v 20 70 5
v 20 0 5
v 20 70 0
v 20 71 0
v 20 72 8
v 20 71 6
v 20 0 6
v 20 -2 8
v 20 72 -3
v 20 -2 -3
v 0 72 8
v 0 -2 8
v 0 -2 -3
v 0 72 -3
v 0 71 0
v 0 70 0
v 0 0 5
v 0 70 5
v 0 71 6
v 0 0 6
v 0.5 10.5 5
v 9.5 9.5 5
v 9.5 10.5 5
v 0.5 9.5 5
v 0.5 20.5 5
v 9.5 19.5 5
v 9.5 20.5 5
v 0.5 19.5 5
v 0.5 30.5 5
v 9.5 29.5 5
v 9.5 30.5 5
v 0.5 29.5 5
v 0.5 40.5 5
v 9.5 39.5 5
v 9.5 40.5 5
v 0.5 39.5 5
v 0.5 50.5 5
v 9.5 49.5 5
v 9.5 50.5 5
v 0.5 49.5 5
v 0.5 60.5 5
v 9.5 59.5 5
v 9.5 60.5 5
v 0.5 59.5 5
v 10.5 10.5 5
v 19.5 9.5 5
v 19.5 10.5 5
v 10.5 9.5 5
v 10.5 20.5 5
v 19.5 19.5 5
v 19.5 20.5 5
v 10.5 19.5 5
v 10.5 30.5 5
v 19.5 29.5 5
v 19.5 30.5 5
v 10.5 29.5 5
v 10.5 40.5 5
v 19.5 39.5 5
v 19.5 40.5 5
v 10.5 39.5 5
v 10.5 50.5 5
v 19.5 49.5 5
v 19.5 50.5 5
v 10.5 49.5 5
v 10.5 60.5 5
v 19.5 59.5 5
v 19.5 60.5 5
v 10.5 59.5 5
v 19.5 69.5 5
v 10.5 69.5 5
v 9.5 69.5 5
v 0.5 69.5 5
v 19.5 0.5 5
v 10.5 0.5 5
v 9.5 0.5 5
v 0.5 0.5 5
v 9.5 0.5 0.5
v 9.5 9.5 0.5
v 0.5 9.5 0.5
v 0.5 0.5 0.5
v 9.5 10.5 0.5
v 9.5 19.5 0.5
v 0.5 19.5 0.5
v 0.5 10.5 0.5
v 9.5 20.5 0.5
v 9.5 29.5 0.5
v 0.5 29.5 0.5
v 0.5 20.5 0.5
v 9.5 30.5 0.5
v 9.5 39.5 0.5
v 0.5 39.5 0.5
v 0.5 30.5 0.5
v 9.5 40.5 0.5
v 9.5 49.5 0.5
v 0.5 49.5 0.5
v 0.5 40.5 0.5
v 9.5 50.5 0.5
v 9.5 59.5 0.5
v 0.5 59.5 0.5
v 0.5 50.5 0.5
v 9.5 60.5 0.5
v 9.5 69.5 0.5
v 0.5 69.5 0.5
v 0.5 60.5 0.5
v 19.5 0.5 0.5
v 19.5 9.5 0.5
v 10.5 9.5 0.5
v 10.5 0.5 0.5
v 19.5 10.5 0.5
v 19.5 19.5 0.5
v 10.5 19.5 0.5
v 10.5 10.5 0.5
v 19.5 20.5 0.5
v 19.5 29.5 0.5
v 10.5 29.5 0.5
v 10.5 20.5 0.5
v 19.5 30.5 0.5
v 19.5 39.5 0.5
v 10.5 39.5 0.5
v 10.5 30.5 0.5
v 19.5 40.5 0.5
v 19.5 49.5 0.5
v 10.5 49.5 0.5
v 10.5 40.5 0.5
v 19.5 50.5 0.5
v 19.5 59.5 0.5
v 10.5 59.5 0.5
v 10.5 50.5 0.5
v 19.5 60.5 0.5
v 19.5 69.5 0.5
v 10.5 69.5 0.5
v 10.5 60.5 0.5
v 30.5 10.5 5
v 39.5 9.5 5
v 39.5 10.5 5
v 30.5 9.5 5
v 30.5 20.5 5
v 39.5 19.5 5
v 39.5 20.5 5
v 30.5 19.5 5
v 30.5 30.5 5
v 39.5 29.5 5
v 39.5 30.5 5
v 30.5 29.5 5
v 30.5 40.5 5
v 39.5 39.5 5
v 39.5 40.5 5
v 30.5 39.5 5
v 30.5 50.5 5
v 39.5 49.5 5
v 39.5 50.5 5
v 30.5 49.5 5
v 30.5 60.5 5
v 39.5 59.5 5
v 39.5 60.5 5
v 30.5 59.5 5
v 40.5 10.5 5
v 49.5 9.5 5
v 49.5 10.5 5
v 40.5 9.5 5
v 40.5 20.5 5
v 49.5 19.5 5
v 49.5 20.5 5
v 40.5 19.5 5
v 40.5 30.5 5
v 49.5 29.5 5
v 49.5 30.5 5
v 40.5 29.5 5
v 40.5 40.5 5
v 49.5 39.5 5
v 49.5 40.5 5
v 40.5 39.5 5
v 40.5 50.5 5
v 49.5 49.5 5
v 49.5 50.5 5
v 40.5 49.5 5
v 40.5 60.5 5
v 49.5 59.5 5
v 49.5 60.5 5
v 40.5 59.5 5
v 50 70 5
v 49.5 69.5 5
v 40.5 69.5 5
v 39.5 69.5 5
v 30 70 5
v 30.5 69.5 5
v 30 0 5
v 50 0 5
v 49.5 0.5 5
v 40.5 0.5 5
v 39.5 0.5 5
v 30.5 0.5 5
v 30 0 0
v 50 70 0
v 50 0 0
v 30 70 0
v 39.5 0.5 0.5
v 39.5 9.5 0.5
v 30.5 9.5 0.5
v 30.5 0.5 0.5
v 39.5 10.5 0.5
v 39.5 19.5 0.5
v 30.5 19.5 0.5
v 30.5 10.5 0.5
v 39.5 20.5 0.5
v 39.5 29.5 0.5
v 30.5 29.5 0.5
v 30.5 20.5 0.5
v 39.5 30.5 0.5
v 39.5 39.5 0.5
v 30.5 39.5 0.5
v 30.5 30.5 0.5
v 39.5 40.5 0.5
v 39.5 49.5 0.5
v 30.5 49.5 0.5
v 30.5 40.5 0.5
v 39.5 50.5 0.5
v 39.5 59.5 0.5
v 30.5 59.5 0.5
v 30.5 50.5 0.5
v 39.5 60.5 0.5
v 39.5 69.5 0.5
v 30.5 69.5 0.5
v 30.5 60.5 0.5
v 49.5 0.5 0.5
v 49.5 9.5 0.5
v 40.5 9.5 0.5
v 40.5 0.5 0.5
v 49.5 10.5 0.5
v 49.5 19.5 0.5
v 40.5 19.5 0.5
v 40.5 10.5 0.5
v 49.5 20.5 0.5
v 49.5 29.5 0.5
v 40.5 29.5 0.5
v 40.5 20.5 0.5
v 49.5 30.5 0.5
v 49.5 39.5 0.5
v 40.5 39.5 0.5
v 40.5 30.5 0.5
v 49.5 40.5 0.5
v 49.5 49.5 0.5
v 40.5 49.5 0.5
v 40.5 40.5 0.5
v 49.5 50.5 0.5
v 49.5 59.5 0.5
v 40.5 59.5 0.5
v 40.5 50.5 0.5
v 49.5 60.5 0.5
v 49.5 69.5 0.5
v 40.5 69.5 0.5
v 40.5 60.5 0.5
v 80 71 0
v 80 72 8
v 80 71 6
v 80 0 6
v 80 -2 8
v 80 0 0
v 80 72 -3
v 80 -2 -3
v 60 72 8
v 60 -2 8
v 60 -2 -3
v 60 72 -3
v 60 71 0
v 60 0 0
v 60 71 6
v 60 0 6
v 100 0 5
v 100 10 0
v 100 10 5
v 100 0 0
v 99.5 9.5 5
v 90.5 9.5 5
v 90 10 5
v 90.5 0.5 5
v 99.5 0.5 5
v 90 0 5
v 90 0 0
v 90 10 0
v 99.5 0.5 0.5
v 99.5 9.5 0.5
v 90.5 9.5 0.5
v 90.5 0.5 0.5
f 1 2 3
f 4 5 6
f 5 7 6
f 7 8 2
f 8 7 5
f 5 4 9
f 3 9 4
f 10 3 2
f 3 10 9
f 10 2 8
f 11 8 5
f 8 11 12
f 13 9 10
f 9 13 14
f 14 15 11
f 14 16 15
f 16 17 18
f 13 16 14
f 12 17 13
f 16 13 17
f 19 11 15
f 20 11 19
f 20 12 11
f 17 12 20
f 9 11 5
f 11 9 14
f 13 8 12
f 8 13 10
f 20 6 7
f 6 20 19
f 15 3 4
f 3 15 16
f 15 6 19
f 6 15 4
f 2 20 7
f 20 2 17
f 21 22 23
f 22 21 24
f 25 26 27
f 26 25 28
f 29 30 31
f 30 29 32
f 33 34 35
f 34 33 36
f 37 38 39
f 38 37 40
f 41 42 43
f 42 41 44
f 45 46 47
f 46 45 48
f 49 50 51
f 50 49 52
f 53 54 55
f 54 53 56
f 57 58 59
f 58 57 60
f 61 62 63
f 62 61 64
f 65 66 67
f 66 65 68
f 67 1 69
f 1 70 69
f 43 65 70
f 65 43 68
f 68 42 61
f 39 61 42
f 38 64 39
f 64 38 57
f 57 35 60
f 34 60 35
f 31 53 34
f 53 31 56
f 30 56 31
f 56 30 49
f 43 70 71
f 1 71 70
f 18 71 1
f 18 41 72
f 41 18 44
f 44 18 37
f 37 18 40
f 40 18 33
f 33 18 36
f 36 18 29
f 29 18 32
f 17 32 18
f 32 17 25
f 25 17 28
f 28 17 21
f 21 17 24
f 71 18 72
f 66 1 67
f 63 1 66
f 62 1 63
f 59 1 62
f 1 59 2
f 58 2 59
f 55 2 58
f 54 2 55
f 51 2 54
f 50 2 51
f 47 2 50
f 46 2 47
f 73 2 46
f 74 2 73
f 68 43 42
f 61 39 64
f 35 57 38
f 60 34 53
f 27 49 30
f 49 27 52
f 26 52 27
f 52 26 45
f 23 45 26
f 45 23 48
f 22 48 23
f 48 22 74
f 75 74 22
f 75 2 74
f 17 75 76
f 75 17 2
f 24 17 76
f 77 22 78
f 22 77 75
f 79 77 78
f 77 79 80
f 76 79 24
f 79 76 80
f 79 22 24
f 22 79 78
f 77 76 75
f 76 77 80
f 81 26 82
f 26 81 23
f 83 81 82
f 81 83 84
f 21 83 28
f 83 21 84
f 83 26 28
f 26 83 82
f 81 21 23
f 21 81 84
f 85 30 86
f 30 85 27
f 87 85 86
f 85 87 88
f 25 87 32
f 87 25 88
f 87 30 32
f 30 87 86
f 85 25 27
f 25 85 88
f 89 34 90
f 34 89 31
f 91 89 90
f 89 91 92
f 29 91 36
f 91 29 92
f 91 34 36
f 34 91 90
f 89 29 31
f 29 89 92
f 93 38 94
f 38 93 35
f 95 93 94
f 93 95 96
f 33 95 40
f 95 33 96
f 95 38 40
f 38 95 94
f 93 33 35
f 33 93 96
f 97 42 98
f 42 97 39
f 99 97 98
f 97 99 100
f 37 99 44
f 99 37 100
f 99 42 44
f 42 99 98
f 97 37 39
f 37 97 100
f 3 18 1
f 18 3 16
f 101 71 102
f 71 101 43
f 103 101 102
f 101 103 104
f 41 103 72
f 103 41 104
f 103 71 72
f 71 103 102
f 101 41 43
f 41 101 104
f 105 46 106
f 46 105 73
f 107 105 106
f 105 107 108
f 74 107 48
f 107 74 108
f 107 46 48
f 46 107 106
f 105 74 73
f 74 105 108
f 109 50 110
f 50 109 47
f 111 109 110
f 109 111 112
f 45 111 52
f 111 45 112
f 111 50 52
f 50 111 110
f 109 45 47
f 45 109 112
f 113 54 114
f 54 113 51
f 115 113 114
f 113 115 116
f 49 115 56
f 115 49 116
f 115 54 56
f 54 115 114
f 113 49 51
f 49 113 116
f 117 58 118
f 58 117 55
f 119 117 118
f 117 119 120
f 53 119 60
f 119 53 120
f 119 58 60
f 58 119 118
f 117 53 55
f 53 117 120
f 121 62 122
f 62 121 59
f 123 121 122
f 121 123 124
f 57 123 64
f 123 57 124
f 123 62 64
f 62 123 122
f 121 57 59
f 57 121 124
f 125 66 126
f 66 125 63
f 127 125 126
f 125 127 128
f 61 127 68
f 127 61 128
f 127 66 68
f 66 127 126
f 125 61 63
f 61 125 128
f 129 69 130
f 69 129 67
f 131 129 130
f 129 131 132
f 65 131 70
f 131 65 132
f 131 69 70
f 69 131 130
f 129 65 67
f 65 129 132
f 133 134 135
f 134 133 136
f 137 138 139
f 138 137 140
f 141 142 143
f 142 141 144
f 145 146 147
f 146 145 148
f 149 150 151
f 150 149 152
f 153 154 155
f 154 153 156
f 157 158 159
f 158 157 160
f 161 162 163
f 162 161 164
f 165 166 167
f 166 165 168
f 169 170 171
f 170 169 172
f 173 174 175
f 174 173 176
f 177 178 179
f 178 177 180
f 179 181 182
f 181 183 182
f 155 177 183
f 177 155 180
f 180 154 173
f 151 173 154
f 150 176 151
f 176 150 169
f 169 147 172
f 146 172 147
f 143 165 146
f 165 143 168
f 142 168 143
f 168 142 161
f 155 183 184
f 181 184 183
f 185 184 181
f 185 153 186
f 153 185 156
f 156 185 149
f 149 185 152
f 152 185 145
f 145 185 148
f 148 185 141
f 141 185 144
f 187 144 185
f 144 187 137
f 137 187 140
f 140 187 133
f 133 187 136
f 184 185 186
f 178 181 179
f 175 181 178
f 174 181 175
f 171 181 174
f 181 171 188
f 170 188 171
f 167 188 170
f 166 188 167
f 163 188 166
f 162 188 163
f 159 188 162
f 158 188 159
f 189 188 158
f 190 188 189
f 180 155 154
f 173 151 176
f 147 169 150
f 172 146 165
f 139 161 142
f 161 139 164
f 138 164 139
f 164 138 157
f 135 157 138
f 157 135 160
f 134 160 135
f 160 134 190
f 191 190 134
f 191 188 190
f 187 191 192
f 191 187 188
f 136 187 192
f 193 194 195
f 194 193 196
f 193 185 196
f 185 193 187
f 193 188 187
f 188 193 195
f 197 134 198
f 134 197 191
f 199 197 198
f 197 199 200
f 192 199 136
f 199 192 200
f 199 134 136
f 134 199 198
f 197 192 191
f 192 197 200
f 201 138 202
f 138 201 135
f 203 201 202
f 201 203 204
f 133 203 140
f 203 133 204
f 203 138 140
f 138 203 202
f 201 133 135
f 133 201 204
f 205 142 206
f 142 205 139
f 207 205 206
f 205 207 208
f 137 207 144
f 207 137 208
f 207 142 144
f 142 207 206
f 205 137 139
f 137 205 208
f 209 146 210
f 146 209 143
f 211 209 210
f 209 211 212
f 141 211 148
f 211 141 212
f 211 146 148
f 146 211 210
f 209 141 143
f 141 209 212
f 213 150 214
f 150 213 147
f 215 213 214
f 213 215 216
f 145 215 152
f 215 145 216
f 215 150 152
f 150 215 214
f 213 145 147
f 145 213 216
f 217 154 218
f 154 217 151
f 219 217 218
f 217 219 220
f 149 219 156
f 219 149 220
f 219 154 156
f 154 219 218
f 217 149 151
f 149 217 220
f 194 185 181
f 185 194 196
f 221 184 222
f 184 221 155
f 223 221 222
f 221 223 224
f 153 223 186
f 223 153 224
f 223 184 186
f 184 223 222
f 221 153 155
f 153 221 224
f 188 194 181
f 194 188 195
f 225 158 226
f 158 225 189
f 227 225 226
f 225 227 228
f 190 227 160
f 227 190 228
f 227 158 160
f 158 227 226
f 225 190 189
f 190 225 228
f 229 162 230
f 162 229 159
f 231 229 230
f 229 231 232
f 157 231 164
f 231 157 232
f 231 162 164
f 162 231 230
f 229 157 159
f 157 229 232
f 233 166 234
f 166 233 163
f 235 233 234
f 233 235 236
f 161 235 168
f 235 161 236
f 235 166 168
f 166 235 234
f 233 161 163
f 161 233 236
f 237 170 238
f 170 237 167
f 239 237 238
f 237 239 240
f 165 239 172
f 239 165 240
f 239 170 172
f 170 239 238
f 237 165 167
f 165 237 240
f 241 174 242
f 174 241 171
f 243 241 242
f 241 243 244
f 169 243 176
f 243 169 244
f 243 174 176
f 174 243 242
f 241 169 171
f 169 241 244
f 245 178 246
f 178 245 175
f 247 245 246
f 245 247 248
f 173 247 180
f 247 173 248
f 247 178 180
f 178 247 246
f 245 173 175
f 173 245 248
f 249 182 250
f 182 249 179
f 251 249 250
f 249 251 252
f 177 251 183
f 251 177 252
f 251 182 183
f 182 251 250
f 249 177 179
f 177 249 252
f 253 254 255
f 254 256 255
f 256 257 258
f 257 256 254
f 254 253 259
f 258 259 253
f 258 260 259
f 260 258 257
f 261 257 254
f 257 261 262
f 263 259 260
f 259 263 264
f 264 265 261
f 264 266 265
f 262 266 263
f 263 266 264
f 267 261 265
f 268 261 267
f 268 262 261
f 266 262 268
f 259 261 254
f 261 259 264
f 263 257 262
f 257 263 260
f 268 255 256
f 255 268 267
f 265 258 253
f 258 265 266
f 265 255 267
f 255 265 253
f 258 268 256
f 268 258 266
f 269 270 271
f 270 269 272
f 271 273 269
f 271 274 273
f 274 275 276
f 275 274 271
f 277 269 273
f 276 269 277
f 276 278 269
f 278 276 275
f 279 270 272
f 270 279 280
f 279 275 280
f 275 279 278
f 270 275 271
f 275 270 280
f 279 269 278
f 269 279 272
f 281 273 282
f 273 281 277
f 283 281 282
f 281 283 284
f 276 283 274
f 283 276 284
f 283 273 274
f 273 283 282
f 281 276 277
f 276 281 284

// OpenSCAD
smallThickness = 0.5;
largeThickness = 2;
hugeThickness = 3;


gridLength = 10;
gridWidth = 10;
gridHeight = 5;

gridBottomHeight = 8;
gridTopHeight = gridHeight - gridBottomHeight;

//--------------------------------------------------------
outsideBox();
grids();
translate([3*gridLength,0,0])  grids();
translate([6*gridLength,0,0])outsideBox();
translate([9*gridLength,0,0])  grid();


//--------------------------------------------------------
module outsideBox()
{
    
    difference()
    {
        difference()
        {
            translate([0,-largeThickness,-hugeThickness])
            cube([2*gridLength,7*gridWidth+2*largeThickness,gridHeight+2*hugeThickness]);
            
            cube([2*gridLength+ 1,7*gridWidth+1,gridHeight+1]);
        }
        translate([-2*largeThickness,0,0])
        cube([4*gridLength,7*gridWidth,gridHeight]);
    }
    
    
}



module grids()
{
    translate([gridLength*0,gridWidth*0,0]) grid();
    translate([gridLength*0,gridWidth*1,0]) grid();
    translate([gridLength*0,gridWidth*2,0]) grid();
    translate([gridLength*0,gridWidth*3,0]) grid();
    translate([gridLength*0,gridWidth*4,0]) grid();
    translate([gridLength*0,gridWidth*5,0]) grid();
    translate([gridLength*0,gridWidth*6,0]) grid();
    
    
    translate([gridLength*1,gridWidth*0,0]) grid();
    translate([gridLength*1,gridWidth*1,0]) grid();
    translate([gridLength*1,gridWidth*2,0]) grid();
    translate([gridLength*1,gridWidth*3,0]) grid();
    translate([gridLength*1,gridWidth*4,0]) grid();
    translate([gridLength*1,gridWidth*5,0]) grid();
    translate([gridLength*1,gridWidth*6,0]) grid();
}



module grid()
{
    difference()
    {
        cube([gridLength,gridWidth,gridHeight]);
        translate([smallThickness,smallThickness,smallThickness])
        cube([gridLength- 2*smallThickness,gridWidth- 2*smallThickness,gridHeight]);
    }
}


module gridBottom()
{
    gridBottomCube();
    scale(0.99)
        gridTopHole();
}

module gridTop()
{
    difference()
    {
        gridTopCube();
        gridTopHole();
        gridTopHole();
    }
}
module gridBottomCube()
{
    translate([0,0,0.5*gridBottomHeight])
        cube([gridLength,gridWidth,gridBottomHeight],center = true);
}       


module gridTopCube()
{
    translate([0,0,gridBottomHeight+ 0.5*gridTopHeight])
        cube([gridLength,gridWidth,gridTopHeight],center = true);
}
module gridTopHole()
{
    translate([0,0,gridBottomHeight+ 0.5*(gridTopHeight- smallThickness)])
        cube([gridLength - 2*smallThickness,gridWidth- 2*smallThickness,gridTopHeight- smallThickness],center = true);
}
     
module gridTop()
{
    difference()
    {
        cube([gridLength,gridWidth,gridTopHeight],center = true);
        translate([0,0, -smallThickness])
            cube([gridLength - smallThickness,gridWidth - smallThickness,gridTopHeight],center = true);
    }
}
        
